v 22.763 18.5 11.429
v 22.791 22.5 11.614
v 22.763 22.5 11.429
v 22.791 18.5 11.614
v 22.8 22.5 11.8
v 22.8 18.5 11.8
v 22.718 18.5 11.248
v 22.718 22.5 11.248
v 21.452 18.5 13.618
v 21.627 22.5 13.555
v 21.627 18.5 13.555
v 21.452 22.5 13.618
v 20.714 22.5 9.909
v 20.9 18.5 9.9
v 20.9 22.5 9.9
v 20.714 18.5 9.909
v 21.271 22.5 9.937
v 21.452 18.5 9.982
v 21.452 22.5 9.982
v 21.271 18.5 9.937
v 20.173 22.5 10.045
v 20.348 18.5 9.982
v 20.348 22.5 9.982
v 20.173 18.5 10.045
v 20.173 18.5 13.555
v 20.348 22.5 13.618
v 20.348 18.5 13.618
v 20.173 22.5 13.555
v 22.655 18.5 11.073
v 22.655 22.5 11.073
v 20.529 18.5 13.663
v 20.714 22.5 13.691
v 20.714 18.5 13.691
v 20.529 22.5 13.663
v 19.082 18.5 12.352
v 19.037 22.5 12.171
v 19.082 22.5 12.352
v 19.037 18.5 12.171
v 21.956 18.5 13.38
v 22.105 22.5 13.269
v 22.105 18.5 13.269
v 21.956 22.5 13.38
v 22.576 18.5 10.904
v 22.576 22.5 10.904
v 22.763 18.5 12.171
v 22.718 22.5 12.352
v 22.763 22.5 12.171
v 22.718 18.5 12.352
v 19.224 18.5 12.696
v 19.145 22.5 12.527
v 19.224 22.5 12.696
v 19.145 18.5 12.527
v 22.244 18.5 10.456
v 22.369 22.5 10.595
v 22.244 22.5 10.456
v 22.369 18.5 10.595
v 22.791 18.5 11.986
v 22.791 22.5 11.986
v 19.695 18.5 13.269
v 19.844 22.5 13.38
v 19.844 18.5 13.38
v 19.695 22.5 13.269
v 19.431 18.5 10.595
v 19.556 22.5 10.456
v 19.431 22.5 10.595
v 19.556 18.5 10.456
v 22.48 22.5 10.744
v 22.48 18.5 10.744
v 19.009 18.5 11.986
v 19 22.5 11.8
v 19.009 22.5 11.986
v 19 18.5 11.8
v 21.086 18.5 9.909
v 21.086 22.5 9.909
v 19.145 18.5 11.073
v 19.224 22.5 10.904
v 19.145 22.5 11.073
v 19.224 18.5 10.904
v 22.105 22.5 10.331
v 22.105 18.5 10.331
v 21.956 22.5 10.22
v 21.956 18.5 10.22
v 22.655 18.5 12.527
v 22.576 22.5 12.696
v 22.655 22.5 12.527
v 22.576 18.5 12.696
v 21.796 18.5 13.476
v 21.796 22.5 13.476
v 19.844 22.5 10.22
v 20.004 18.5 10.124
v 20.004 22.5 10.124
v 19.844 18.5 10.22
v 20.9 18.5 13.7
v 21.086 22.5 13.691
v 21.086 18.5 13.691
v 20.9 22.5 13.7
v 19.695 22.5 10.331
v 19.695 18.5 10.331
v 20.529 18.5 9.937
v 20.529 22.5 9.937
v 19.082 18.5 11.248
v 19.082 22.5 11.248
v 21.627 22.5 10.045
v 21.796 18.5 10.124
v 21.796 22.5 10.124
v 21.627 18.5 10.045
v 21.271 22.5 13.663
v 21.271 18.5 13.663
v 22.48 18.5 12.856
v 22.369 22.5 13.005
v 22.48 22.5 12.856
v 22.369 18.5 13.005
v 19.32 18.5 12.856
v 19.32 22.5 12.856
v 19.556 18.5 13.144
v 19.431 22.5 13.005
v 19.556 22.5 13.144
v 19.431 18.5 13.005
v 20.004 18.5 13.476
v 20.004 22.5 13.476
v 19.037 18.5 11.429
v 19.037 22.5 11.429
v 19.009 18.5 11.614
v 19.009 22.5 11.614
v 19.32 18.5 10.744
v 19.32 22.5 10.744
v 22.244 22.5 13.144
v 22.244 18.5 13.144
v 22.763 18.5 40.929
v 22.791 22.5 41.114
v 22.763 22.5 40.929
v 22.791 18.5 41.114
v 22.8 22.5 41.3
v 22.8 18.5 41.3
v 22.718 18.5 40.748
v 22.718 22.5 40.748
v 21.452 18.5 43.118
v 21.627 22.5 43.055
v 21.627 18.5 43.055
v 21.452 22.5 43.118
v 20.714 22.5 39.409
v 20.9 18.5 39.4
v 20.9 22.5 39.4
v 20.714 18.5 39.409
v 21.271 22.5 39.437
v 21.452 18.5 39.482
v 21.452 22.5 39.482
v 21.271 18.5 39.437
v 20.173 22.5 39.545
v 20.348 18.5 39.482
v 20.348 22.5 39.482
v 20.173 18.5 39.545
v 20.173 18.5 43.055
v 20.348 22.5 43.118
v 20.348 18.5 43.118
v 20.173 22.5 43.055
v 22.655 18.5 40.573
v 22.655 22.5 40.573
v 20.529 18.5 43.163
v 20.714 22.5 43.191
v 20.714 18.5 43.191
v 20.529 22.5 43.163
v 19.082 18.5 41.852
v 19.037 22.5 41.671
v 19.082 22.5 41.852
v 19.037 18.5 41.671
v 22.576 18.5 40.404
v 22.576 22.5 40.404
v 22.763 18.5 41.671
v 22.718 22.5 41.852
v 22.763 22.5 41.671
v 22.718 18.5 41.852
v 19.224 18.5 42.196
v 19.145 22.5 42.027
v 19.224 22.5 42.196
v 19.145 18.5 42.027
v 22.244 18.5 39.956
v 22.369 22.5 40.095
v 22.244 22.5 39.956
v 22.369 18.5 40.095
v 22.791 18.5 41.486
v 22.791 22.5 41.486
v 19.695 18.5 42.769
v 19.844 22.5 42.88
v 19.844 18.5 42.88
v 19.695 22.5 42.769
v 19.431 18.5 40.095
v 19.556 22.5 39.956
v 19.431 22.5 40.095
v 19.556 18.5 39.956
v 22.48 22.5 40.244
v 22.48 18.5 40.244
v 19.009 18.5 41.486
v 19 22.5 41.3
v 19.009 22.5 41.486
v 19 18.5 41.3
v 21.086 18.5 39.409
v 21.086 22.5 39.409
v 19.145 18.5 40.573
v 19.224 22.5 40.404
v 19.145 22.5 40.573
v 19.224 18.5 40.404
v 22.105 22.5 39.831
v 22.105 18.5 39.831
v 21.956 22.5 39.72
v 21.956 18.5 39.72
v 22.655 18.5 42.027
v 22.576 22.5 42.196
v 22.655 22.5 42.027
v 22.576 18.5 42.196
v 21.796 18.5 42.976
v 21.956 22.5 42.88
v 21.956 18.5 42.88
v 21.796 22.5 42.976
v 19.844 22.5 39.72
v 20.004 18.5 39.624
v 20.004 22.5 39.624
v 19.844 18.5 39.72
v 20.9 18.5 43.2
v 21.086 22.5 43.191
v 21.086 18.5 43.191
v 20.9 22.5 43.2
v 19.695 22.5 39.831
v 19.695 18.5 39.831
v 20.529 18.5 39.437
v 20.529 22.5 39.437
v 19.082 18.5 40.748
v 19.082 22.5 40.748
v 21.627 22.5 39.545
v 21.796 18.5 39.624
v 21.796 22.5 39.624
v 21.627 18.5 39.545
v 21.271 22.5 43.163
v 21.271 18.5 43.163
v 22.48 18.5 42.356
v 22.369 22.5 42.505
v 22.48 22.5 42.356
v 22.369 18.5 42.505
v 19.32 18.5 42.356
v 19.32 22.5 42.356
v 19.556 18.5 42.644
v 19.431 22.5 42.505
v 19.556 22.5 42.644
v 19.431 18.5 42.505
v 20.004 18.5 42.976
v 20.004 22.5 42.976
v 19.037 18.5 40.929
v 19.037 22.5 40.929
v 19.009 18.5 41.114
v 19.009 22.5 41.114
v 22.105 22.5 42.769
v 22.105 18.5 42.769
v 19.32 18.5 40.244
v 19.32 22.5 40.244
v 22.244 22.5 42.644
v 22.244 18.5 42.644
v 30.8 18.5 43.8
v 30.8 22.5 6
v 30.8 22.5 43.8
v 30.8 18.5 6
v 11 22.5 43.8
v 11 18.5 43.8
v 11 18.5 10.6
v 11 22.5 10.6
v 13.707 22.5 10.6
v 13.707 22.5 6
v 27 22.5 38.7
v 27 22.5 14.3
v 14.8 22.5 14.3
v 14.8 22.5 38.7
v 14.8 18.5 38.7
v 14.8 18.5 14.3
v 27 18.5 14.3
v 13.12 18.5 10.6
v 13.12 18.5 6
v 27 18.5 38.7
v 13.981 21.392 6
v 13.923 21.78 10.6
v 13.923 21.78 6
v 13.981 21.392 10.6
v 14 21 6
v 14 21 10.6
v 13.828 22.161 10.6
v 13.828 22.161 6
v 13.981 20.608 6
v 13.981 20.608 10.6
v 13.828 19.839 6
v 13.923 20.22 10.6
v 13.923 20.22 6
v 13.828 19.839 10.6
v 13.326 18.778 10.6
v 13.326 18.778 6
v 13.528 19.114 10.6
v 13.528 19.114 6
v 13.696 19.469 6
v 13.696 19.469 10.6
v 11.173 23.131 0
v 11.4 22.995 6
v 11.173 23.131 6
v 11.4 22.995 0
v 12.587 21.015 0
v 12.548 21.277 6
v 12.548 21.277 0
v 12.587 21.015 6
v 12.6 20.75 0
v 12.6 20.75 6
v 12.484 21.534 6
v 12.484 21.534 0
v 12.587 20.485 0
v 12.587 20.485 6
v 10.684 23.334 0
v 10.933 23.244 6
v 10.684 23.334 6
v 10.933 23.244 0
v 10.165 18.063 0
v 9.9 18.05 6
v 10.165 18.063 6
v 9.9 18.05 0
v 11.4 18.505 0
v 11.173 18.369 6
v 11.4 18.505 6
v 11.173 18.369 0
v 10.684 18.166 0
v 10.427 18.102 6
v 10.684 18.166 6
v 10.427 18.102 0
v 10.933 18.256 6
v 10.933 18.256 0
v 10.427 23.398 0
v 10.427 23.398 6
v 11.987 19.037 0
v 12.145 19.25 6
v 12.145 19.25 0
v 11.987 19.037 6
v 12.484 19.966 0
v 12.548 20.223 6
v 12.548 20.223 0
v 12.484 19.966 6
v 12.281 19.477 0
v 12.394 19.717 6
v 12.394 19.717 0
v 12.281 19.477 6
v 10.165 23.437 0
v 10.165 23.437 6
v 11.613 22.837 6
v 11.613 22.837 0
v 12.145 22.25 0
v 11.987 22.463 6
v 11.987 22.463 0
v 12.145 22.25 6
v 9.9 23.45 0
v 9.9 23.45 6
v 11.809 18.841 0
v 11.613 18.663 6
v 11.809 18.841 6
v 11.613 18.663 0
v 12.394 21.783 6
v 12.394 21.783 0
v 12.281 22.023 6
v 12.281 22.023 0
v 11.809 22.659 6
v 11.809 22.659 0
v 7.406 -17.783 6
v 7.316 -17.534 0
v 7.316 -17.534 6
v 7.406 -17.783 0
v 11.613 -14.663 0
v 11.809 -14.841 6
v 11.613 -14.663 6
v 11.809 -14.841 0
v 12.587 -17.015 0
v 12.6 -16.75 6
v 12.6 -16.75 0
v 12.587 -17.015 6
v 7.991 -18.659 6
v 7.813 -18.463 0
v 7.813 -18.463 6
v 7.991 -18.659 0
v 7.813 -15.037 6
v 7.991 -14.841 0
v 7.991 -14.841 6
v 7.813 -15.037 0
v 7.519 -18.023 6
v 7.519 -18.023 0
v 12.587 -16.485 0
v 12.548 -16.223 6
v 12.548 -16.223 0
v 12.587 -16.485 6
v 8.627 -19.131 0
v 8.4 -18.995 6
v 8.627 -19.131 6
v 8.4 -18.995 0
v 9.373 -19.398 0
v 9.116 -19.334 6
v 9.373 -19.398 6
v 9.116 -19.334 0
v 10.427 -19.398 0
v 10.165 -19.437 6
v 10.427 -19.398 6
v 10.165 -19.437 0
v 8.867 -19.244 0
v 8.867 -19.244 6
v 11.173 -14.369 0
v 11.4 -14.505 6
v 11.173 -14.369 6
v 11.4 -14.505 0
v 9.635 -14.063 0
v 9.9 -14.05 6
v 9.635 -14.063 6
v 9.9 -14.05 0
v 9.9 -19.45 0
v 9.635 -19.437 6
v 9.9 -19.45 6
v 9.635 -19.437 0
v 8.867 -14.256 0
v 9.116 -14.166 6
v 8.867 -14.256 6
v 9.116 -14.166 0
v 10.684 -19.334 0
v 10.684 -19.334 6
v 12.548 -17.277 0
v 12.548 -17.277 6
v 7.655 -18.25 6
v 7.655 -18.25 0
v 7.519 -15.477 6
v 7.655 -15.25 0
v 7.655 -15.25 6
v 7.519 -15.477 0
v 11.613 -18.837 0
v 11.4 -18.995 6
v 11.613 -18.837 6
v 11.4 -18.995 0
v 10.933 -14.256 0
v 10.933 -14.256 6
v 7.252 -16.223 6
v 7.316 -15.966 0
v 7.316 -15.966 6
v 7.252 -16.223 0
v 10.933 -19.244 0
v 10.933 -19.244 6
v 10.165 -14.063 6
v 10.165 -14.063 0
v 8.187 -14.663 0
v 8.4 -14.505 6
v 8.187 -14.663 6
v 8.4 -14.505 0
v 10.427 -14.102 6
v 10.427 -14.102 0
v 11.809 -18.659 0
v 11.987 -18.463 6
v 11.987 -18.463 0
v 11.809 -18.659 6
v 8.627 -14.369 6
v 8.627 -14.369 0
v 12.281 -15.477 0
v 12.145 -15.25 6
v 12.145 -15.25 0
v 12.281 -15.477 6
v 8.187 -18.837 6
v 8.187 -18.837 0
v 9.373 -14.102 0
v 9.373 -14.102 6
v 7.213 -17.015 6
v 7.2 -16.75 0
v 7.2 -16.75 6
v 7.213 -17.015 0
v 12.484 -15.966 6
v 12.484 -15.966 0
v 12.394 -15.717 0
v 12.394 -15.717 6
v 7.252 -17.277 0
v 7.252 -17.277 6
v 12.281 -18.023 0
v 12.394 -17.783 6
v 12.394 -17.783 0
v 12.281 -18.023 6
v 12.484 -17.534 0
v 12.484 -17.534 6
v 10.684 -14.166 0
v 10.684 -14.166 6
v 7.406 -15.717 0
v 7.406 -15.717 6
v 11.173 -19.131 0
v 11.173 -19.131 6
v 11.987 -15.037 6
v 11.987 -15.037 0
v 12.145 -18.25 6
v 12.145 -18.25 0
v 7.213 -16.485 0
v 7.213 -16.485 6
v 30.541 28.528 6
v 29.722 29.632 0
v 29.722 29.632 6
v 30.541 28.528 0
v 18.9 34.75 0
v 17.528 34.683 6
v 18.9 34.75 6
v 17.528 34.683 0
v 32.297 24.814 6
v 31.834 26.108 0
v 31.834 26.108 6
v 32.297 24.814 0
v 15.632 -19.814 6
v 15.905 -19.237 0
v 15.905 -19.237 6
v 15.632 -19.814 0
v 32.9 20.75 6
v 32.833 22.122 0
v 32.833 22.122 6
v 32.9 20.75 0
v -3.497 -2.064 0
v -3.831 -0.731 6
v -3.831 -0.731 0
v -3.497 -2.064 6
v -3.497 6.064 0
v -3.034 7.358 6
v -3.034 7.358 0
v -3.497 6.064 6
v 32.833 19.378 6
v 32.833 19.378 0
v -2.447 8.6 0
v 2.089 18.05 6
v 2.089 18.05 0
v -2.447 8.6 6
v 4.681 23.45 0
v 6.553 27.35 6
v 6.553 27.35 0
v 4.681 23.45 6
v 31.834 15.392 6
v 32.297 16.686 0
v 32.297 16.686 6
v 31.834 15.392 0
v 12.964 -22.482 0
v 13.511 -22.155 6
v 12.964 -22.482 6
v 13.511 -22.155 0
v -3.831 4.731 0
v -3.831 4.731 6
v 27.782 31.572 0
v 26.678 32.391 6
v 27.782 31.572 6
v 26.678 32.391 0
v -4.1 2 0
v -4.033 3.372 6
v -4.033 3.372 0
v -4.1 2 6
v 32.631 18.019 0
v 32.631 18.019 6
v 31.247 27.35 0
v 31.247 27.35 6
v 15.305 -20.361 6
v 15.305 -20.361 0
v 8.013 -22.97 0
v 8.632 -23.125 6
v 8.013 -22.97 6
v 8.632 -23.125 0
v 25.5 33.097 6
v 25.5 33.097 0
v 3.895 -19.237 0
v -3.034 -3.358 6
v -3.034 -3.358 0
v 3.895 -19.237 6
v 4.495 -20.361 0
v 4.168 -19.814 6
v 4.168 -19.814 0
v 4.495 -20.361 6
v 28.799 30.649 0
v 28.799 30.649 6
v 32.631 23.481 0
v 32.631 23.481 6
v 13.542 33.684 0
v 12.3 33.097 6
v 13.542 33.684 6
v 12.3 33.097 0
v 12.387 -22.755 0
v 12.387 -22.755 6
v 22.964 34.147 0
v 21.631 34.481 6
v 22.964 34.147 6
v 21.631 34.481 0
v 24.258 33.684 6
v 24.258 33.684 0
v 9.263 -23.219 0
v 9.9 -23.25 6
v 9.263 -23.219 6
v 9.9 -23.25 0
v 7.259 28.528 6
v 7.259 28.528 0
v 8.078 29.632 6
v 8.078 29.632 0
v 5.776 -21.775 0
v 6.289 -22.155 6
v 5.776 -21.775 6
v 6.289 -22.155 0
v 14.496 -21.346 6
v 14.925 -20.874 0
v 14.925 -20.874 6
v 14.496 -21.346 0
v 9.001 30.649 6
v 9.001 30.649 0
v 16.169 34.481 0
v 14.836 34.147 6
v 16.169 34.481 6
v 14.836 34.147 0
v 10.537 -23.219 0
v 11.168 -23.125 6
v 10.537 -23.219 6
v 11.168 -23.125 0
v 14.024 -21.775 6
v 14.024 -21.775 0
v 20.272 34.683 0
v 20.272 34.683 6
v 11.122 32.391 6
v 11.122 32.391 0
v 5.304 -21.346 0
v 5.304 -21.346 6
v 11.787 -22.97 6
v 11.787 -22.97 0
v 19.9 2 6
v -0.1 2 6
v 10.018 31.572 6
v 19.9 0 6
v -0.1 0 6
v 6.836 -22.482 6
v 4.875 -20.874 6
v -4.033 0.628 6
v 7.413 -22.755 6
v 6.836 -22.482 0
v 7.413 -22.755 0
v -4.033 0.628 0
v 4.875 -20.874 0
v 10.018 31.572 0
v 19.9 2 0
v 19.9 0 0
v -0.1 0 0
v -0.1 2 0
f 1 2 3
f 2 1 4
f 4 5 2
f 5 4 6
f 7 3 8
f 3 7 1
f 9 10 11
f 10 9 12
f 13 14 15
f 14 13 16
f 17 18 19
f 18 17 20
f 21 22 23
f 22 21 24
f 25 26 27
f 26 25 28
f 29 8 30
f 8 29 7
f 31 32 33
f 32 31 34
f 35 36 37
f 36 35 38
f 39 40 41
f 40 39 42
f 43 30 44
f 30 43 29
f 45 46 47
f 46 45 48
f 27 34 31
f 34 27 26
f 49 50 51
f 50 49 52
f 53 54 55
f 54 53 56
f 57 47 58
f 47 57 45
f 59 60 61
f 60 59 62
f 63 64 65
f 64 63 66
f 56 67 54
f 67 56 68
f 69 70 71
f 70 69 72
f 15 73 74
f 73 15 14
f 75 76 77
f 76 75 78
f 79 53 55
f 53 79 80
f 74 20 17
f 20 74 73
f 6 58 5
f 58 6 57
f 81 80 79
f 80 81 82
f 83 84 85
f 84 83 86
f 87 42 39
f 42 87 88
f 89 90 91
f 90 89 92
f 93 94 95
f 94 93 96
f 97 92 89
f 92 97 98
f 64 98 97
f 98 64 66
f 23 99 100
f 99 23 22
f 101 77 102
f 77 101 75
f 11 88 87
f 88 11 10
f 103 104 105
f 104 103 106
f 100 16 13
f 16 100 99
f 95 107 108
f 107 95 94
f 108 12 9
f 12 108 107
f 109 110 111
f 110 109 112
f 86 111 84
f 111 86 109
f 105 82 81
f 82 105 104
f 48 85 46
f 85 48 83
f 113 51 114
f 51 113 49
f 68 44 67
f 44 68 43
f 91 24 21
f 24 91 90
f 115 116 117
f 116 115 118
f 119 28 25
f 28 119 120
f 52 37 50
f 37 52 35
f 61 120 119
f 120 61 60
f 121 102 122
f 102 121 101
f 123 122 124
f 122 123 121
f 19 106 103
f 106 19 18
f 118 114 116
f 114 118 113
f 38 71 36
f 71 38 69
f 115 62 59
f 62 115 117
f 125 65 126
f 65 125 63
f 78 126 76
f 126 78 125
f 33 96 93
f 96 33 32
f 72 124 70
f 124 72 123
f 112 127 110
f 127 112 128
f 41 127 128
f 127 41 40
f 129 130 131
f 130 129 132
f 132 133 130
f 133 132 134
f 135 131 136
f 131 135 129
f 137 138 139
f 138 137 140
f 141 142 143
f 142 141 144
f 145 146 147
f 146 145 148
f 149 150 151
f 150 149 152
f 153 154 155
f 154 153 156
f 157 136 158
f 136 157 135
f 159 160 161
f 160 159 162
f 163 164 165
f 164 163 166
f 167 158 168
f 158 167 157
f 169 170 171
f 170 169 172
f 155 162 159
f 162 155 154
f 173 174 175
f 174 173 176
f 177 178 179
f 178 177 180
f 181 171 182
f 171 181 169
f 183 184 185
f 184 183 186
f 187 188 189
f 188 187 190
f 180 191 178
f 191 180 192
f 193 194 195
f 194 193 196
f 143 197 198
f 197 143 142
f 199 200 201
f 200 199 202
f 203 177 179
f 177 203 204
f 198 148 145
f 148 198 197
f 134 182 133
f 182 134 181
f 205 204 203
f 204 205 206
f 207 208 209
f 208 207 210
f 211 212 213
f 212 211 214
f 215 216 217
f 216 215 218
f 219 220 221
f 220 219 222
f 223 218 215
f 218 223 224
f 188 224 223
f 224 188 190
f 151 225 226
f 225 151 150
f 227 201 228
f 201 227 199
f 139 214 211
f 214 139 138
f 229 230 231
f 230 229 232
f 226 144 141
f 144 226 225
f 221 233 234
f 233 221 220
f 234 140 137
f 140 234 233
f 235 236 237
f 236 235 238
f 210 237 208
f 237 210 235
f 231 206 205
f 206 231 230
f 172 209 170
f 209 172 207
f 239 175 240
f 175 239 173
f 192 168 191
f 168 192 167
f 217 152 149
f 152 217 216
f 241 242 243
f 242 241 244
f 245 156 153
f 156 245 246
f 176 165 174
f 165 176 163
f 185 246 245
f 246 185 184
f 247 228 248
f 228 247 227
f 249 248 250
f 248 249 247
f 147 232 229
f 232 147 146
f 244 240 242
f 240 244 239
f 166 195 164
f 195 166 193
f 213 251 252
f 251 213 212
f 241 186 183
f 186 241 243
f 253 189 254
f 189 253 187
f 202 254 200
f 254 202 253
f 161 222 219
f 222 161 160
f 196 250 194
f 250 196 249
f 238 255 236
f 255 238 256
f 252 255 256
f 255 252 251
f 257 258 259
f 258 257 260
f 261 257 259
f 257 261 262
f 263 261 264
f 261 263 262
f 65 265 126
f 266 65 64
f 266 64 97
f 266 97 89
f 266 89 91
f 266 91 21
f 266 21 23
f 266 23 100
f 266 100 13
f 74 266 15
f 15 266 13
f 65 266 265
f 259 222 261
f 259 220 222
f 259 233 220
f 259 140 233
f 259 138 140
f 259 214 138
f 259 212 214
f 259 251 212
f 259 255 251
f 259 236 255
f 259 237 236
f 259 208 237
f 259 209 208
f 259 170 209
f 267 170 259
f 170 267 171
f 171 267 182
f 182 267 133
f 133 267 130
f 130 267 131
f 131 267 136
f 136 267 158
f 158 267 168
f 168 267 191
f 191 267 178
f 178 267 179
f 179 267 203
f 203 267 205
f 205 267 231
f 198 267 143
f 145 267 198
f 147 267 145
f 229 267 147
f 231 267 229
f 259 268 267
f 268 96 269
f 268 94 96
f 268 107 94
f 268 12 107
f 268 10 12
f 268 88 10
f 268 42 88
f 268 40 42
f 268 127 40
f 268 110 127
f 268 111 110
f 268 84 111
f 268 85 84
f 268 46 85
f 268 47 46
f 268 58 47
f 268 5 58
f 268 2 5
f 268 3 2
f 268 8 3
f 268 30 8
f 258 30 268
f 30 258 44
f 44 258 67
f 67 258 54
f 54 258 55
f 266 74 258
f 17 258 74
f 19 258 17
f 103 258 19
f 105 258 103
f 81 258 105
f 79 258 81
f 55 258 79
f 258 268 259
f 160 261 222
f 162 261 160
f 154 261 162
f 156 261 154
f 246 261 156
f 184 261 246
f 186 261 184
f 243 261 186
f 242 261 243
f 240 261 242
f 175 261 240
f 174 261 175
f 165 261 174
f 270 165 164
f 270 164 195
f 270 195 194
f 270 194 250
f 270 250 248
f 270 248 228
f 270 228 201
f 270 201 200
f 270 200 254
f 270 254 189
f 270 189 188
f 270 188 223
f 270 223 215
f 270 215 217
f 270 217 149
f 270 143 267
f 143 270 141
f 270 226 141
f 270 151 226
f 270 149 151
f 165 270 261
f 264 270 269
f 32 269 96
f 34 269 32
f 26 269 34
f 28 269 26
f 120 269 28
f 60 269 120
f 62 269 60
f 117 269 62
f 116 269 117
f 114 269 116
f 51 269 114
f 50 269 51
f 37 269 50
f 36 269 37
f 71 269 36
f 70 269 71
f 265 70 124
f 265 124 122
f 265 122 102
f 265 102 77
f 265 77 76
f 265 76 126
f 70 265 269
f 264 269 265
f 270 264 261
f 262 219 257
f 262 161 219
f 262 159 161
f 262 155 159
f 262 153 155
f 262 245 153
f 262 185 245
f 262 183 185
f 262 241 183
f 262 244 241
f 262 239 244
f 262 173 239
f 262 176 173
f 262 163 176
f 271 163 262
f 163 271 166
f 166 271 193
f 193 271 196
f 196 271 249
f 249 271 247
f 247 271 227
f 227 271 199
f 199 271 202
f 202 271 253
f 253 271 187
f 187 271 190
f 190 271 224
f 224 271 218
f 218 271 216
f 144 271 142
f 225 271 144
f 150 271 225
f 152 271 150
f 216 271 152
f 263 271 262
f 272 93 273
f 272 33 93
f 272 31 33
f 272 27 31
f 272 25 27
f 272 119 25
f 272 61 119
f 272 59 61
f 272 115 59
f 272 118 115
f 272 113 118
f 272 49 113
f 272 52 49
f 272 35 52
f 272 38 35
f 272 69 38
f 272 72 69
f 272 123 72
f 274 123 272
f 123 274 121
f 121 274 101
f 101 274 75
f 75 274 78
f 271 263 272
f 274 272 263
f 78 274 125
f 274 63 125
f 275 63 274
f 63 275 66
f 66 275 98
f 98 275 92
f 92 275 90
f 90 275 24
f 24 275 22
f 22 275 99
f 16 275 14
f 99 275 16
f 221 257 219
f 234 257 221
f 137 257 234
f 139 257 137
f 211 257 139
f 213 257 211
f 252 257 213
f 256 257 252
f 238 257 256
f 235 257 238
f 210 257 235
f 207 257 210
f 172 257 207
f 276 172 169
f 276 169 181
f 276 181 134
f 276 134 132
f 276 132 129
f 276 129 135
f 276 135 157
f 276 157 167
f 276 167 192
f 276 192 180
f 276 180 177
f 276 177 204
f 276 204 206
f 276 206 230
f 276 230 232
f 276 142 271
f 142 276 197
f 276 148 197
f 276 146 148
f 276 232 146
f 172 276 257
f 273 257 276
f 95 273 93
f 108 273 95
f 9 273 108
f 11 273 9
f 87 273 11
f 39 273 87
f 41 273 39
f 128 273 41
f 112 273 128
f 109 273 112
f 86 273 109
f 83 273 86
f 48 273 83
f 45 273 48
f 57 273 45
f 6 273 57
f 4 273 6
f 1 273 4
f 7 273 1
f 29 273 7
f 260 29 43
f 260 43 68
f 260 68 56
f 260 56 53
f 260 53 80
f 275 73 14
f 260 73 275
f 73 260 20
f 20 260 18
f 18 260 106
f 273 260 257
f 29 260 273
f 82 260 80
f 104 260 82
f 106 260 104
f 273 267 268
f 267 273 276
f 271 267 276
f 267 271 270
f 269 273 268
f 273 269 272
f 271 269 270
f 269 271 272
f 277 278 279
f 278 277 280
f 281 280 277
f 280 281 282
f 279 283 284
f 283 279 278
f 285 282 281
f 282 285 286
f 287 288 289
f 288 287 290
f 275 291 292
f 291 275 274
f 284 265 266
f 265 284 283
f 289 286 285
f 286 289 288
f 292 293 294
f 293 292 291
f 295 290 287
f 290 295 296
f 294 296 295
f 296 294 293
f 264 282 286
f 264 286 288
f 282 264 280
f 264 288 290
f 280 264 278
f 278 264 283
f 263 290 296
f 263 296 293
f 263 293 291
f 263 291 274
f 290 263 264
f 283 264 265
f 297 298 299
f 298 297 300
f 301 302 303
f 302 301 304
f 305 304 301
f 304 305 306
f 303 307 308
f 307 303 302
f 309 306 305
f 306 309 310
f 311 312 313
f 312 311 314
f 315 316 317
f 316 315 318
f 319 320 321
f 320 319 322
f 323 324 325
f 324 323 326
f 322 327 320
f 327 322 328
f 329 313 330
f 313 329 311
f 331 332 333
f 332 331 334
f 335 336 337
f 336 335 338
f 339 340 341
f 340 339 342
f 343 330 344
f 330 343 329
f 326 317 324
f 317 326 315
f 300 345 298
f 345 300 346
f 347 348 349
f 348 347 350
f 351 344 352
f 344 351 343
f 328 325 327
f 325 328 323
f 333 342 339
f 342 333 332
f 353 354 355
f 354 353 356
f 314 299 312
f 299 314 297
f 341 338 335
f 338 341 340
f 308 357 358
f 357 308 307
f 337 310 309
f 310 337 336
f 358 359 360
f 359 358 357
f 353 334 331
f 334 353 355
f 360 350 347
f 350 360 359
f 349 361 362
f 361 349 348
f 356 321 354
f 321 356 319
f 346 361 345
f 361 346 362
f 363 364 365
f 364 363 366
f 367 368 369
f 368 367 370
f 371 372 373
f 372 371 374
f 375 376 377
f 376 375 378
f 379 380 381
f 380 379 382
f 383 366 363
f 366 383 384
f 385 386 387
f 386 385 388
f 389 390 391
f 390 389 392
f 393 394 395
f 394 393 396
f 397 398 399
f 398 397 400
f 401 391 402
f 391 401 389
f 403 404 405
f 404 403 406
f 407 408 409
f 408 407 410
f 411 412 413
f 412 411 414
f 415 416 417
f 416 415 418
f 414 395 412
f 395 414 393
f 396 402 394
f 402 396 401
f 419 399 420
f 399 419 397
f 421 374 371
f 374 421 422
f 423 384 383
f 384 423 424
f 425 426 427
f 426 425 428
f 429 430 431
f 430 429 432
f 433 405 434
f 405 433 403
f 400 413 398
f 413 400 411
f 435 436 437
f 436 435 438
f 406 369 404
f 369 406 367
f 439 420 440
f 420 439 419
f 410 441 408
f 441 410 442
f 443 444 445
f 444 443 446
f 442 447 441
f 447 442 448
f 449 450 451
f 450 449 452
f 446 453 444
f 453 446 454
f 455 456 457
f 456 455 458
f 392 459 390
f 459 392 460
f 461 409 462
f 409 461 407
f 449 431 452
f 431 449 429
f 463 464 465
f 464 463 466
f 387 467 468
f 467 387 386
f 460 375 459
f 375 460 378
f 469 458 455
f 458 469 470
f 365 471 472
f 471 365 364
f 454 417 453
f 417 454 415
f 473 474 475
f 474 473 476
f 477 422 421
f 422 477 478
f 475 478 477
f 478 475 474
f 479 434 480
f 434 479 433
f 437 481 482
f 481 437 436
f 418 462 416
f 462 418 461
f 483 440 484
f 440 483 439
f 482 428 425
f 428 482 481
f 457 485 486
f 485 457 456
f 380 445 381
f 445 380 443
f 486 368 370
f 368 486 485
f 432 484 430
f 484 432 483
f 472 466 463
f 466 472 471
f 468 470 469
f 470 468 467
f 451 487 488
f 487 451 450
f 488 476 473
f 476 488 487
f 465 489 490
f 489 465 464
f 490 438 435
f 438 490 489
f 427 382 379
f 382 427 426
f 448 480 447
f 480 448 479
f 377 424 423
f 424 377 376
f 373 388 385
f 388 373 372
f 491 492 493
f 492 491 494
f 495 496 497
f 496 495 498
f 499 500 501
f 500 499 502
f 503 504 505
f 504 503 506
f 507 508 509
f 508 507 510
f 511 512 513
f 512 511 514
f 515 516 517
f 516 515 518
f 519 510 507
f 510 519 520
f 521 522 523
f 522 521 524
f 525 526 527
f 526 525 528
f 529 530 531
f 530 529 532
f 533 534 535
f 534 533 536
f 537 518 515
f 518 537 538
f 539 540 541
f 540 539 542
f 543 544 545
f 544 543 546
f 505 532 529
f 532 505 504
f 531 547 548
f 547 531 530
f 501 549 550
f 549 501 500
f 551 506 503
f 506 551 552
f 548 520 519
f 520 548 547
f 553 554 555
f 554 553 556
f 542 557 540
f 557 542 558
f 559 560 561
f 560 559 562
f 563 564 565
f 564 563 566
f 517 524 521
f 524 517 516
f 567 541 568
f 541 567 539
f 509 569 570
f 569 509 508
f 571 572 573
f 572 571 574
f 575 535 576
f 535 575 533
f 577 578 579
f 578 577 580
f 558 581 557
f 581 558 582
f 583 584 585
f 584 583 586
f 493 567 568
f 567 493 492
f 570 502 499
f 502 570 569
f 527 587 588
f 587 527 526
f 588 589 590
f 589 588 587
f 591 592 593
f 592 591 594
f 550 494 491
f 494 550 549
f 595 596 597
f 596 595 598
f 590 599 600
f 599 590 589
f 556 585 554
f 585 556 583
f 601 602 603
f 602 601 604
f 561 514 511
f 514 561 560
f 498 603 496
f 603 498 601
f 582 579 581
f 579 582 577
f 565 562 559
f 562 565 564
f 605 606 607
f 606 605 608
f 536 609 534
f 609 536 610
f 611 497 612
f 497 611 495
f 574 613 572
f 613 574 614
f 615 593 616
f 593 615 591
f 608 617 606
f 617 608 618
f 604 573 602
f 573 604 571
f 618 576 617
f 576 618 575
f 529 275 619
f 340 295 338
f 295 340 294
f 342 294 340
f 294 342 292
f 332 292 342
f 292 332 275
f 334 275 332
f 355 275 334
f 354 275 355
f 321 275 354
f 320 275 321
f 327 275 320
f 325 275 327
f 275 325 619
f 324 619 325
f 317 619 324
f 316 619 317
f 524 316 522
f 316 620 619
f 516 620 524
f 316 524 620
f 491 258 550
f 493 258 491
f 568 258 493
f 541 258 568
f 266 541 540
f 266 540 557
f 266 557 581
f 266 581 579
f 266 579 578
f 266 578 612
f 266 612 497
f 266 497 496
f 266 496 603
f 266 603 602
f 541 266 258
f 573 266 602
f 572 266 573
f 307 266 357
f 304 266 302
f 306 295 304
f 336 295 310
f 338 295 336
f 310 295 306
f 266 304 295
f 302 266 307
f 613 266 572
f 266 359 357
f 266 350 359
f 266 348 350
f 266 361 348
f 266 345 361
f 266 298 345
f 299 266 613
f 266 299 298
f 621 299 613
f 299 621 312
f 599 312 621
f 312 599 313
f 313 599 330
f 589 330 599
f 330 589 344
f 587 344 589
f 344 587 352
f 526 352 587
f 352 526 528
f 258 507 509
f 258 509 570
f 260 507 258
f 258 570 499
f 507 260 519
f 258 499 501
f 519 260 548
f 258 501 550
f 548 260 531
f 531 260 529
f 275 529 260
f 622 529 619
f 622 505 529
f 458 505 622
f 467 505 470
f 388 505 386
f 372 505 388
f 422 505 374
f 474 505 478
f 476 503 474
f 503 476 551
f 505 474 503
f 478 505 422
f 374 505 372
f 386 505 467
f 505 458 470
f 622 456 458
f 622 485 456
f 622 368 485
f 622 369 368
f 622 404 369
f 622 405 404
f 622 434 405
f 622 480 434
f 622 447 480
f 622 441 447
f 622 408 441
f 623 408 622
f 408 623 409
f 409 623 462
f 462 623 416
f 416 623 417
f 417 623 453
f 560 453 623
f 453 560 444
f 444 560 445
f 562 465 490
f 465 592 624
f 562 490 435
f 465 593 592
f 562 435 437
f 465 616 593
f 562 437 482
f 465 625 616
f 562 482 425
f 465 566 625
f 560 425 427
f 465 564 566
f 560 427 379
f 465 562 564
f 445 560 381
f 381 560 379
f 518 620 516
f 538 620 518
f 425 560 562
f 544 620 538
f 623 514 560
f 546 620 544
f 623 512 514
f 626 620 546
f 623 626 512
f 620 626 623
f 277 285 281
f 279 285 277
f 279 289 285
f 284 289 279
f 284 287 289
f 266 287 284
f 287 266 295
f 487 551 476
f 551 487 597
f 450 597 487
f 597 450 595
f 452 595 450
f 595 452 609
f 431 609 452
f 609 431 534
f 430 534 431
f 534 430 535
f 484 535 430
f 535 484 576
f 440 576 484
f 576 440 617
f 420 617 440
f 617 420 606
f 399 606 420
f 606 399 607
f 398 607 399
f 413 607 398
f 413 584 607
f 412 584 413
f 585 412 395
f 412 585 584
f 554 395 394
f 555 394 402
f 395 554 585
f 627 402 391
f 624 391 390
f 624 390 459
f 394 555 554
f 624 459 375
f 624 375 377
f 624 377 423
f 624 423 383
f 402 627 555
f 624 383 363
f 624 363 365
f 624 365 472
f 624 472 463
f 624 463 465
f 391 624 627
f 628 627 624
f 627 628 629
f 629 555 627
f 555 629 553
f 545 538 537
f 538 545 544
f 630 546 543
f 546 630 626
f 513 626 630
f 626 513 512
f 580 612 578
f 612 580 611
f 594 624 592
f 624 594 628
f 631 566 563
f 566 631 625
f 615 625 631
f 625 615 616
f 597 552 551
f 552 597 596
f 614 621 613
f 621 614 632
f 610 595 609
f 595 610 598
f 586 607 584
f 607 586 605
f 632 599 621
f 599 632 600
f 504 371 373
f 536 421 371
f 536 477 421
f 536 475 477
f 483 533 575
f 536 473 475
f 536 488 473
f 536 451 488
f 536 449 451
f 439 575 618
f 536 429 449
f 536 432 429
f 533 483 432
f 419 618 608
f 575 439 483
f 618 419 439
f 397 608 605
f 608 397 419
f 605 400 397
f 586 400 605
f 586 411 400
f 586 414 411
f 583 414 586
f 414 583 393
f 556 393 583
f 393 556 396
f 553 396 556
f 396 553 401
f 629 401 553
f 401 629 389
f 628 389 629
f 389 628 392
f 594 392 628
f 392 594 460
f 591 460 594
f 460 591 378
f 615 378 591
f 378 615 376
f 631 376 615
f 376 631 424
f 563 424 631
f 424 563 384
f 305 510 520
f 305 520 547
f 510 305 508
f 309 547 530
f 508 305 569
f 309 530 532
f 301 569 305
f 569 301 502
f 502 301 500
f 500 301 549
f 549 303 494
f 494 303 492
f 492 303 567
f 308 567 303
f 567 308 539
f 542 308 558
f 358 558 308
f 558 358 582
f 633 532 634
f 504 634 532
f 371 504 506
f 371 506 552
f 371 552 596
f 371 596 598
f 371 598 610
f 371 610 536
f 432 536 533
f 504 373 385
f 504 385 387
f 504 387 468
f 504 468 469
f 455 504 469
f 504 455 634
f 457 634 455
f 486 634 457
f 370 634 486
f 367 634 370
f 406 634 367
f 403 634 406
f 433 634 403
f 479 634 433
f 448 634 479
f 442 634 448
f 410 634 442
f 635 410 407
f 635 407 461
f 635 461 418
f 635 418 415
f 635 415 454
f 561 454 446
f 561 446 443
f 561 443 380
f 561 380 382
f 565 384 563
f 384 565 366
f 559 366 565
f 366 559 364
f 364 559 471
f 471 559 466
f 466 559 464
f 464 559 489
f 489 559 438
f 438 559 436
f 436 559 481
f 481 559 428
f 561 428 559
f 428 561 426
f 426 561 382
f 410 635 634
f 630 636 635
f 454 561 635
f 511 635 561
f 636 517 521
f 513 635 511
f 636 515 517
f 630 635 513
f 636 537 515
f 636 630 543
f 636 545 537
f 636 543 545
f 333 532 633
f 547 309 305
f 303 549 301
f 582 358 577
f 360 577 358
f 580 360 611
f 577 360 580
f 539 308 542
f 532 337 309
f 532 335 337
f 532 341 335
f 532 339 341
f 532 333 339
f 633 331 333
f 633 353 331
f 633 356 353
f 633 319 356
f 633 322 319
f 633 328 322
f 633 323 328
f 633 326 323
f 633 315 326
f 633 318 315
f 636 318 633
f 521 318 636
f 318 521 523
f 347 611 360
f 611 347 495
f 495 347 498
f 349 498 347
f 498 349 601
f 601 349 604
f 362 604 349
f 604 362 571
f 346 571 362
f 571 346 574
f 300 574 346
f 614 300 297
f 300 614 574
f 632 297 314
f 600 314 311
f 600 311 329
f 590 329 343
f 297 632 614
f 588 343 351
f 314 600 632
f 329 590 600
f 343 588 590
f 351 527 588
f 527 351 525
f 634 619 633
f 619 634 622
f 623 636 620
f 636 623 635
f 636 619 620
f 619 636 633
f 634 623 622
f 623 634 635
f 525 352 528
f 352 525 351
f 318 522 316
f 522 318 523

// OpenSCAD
// $fn = 256;
//$fn = 128;
$fn = 64;
//$fn = 32;
// $fn = 16;
//cube([100, 100, 1], center = true);

baseThickness = 6;
wallThickness = 4;
supportLength = 5.5;
servoWidth = 11.8;
servoHeight = 24;
gap = 0.2;
sideMount = true;

module SG90(){
    //colore verde-main color
    color("Blue",0.8){ 
    //corpo principale
    cube([11.8,22.7,22.5]); 
    //ali di fissaggio
    difference(){    
    translate([0,4.3,-4.7]) cube([11.8,2.5,31.9]); 
        translate([5.9,7.3,-2.4])rotate([90,0,0])
        cylinder(r=1,h=3.5,$fn=100);
        translate([5.9,7.3,24.9])rotate([90,0,0])
        cylinder(r=1,h=3.5,$fn=100);
        translate([5.25,4,25.6])cube([1.3,3.2,2.3]);
        translate([5.25,4,-4.7])cube([1.3,3.2,2.3]);
    }
    //cilindro ghiera
    translate([5.9,0,16.6]) rotate([90,0,0])
        cylinder(r=5.9,h=4,$fn=100);
    }
    //cilindro rotante  
    translate([5.9,-4,16.6]) rotate([90,0,0])
        color("White",0.8)cylinder(r=2.3,h=3.2,$fn=100);       
}



/*translate([wallThickness, 11, supportLength + wallThickness])
  mirror([0,1,0])
    SG90();
*/
module servoBracket() {
  translate([0,sideMount ? 23.5 : 0,wallThickness - gap])
    difference() {
      cube([servoWidth + 2 * wallThickness, wallThickness, servoHeight + 2 * supportLength + 5]);
      translate([wallThickness - gap, -gap, supportLength + 5])
        cube([servoWidth + 2 * gap, wallThickness + 2 * gap, servoHeight + 2 * gap]);
      for (i = [0, 1])
        translate([wallThickness + 5.9, -gap, 8 + (i * 29.5)])
          rotate([-90,0,0])
            cylinder(r=1.9,h=4.5);
    }

  difference() {
    translate([servoWidth / 2 + wallThickness, wallThickness / 2, 0]) {
      //cylinder(r = 11,h = 2 * wallThickness);
      
      difference() 
      {
        hull() 
        {
          cylinder(r = 14,h = baseThickness);
          for (i = [0, 1]) mirror([0, i, 0])
            translate([0, 18.75, 0])
              cylinder(r = (sideMount && i == 0 ? 9 : 2.5) + wallThickness,h = baseThickness);
        }
        for (i = [0, 1]) mirror([0, i, 0])
          translate([0, 18.75, -gap])
            cylinder(r = 2.7,h = baseThickness + 2 * gap);
        translate([servoWidth / 2 + wallThickness, -wallThickness / 2, -gap])
          cube([8, wallThickness, baseThickness + 2 * gap]);
      }
    }
  }
}

module servoBracketHorizontal() {
  translate([-10,sideMount ? 23.5 : 0,0])
    difference() {
      cube([servoHeight + 3 * supportLength, wallThickness, servoWidth + 12]);
      translate([supportLength + 2.3, -gap, 6])
        cube([servoHeight + 2 * gap, wallThickness + 2 * gap, servoWidth + 2 * gap]);
      for (i = [0, 1])
        translate([5.3 + (i * 29.5), -gap, 2 * wallThickness + 3.9])
          rotate([-90,0,0])
            cylinder(r=1.9,h=4.5);
    }

  difference() {
    translate([servoWidth / 2 + wallThickness, wallThickness / 2, 0]) {
      //cylinder(r = 11,h = 2 * wallThickness);
      
      difference() 
      {
        hull() 
        {
          cylinder(r = 14,h = baseThickness);
          for (i = [0, 1]) mirror([0, i, 0])
            translate([0, 18.75, 0])
              cylinder(r = (sideMount && i == 0 ? 9 : 2.5) + wallThickness,h = baseThickness);
        }
        for (i = [0, 1]) mirror([0, i, 0])
          translate([0, 18.75, -gap])
            cylinder(r = 2.7,h = baseThickness + 2 * gap);
        translate([servoWidth / 2 + wallThickness, -wallThickness / 2, -gap])
          cube([8, wallThickness, baseThickness + 2 * gap]);
      }
    }
  }
}

module servoBracketDriverSide() {
  translate([11,18.5,wallThickness - gap]) {
    difference() {
      cube([servoWidth + 2 * wallThickness, wallThickness, servoHeight + 2 * supportLength + 5]);
      translate([wallThickness - gap, -gap, supportLength + 5])
        cube([servoWidth + 2 * gap, wallThickness + 2 * gap, servoHeight + 2 * gap]);
      for (i = [0, 1])
        translate([wallThickness + 5.9, -gap, 8 + (i * 29.5)])
          rotate([-90,0,0])
            cylinder(r=1.9,h=4.5);
      translate([-1, 2.5, -gap])
        cylinder(r = 4,h = 7);
    }
  }

  difference() {
    translate([servoWidth / 2 + wallThickness, wallThickness / 2, 0]) {
      //cylinder(r = 11,h = 2 * wallThickness);
      
      difference() 
      {
        hull() 
        {
          cylinder(r = 14,h = baseThickness);
          for (i = [0, 1]) mirror([0, i, 0])
            translate([(i == 0 ? 9 : 0), 18.75, 0])
              cylinder(r = (i == 0 ? 10 : 2.5) + wallThickness,h = baseThickness);
        }
        for (i = [0, 1]) mirror([0, i, 0])
          translate([0, 18.75, -gap])
            cylinder(r = 2.7,h = baseThickness + 2 * gap);
        translate([-10, -wallThickness / 2, -gap])
          cube([20, 2, baseThickness + 2 * gap]);
        translate([-10, 18.75 - 2.7, -gap])
          cube([10, 5.4, baseThickness + 2 * gap]);
      }
    }
  }
}

module driverSideMount()
{
  difference() {
    cylinder(11, 0.8, 3.4);
    translate([0,0,4.5]) difference() {
      cylinder(h = 1.5, d = 5);
      cylinder(h = 1.5, d = 3.44);
    }
    translate([0,0,4.4]) difference() {
      cylinder(h = 0.2, d = 5);
      cylinder(h = 0.2, d = 2);
    }
    translate([0,0,0.5]) difference() {
      cylinder(h = 4, r1 = 0.6, r2 = 1.4);
      cylinder(h = 4, r1 = 0.6, r2 = 1);
    }
    for (i = [0, 1]) for (j = [0, 1]) rotate([0, 0, j * 90]) mirror([0, i, 0])
      translate([-0.15, 1, 2.6])
        cube([0.3, 6, 2]);
    
    translate([0, 0, 7])
      cylinder(h = 5, r = 1.9);
  }
}

module center() {
  difference() {
    union() {
      difference() {
        cube([282, 75, wallThickness], center = true);
        cube([266, 55, wallThickness + 2 * gap], center = true);
      }
      translate([282 / 2 - wallThickness / 2, 0, wallThickness / 2]) {
        rotate([45,0,0])
        cube([wallThickness, 53, 53], center = true);
      }
    }
    translate([0, 0, -wallThickness - 50])
      cube([300, 100, 100 + wallThickness], center = true);
  }
}

module pushPullMount() {
  difference() {
    union() {
      cube([20 + 2 * wallThickness, 3.5 + 2 * wallThickness, 2], center = true);
      translate([-9, 0, 4.4])
        cube([10, 3.5 + 2 * wallThickness, 7], center = true);
    }
    for (i = [0, 1])
      translate([i * 10, 0, -gap])
        cylinder(r = 1.7,h = 3.5 + 2 * wallThickness + 2 * gap, center = true);
    translate([-9, -6, 4])
      rotate([-90,0,0])
        cylinder(r=1.4,h=12);
  }
}

module dashVentBracket() {
  difference() {
    hull() {
      cylinder(r=10,h=wallThickness, center = true);
      translate([-10, 0, 0]) {
        cylinder(r=4,h=wallThickness, center = true);
      }
    }
    translate([-10, 0, 0]) {
      cylinder(r=1.4,h=wallThickness + 0.2, center = true);
    }
    cylinder(r=2.3,h=wallThickness + 0.2, center = true);
    hull() translate([0, 0, wallThickness - 1.5]) {
      cylinder(r=6.5,h=wallThickness + 0.2, center = true);        
      translate([10, 0, 0]) {
        cylinder(r=7,h=wallThickness + 0.2, center = true);
      }
    }
/*
    for (i = [0, 1])
      translate([i * 10, 0, -gap])
        cylinder(r = 1.7,h = 3.5 + 2 * wallThickness + 2 * gap, center = true);
    translate([-9, -6, 4])
      rotate([-90,0,0])
        cylinder(r=1.4,h=12);
*/
  }
}

// center();
// servoBracket();
// servoBracketHorizontal();
// pushPullMount();
servoBracketDriverSide();
// dashVentBracket();
//  driverSideMount();
